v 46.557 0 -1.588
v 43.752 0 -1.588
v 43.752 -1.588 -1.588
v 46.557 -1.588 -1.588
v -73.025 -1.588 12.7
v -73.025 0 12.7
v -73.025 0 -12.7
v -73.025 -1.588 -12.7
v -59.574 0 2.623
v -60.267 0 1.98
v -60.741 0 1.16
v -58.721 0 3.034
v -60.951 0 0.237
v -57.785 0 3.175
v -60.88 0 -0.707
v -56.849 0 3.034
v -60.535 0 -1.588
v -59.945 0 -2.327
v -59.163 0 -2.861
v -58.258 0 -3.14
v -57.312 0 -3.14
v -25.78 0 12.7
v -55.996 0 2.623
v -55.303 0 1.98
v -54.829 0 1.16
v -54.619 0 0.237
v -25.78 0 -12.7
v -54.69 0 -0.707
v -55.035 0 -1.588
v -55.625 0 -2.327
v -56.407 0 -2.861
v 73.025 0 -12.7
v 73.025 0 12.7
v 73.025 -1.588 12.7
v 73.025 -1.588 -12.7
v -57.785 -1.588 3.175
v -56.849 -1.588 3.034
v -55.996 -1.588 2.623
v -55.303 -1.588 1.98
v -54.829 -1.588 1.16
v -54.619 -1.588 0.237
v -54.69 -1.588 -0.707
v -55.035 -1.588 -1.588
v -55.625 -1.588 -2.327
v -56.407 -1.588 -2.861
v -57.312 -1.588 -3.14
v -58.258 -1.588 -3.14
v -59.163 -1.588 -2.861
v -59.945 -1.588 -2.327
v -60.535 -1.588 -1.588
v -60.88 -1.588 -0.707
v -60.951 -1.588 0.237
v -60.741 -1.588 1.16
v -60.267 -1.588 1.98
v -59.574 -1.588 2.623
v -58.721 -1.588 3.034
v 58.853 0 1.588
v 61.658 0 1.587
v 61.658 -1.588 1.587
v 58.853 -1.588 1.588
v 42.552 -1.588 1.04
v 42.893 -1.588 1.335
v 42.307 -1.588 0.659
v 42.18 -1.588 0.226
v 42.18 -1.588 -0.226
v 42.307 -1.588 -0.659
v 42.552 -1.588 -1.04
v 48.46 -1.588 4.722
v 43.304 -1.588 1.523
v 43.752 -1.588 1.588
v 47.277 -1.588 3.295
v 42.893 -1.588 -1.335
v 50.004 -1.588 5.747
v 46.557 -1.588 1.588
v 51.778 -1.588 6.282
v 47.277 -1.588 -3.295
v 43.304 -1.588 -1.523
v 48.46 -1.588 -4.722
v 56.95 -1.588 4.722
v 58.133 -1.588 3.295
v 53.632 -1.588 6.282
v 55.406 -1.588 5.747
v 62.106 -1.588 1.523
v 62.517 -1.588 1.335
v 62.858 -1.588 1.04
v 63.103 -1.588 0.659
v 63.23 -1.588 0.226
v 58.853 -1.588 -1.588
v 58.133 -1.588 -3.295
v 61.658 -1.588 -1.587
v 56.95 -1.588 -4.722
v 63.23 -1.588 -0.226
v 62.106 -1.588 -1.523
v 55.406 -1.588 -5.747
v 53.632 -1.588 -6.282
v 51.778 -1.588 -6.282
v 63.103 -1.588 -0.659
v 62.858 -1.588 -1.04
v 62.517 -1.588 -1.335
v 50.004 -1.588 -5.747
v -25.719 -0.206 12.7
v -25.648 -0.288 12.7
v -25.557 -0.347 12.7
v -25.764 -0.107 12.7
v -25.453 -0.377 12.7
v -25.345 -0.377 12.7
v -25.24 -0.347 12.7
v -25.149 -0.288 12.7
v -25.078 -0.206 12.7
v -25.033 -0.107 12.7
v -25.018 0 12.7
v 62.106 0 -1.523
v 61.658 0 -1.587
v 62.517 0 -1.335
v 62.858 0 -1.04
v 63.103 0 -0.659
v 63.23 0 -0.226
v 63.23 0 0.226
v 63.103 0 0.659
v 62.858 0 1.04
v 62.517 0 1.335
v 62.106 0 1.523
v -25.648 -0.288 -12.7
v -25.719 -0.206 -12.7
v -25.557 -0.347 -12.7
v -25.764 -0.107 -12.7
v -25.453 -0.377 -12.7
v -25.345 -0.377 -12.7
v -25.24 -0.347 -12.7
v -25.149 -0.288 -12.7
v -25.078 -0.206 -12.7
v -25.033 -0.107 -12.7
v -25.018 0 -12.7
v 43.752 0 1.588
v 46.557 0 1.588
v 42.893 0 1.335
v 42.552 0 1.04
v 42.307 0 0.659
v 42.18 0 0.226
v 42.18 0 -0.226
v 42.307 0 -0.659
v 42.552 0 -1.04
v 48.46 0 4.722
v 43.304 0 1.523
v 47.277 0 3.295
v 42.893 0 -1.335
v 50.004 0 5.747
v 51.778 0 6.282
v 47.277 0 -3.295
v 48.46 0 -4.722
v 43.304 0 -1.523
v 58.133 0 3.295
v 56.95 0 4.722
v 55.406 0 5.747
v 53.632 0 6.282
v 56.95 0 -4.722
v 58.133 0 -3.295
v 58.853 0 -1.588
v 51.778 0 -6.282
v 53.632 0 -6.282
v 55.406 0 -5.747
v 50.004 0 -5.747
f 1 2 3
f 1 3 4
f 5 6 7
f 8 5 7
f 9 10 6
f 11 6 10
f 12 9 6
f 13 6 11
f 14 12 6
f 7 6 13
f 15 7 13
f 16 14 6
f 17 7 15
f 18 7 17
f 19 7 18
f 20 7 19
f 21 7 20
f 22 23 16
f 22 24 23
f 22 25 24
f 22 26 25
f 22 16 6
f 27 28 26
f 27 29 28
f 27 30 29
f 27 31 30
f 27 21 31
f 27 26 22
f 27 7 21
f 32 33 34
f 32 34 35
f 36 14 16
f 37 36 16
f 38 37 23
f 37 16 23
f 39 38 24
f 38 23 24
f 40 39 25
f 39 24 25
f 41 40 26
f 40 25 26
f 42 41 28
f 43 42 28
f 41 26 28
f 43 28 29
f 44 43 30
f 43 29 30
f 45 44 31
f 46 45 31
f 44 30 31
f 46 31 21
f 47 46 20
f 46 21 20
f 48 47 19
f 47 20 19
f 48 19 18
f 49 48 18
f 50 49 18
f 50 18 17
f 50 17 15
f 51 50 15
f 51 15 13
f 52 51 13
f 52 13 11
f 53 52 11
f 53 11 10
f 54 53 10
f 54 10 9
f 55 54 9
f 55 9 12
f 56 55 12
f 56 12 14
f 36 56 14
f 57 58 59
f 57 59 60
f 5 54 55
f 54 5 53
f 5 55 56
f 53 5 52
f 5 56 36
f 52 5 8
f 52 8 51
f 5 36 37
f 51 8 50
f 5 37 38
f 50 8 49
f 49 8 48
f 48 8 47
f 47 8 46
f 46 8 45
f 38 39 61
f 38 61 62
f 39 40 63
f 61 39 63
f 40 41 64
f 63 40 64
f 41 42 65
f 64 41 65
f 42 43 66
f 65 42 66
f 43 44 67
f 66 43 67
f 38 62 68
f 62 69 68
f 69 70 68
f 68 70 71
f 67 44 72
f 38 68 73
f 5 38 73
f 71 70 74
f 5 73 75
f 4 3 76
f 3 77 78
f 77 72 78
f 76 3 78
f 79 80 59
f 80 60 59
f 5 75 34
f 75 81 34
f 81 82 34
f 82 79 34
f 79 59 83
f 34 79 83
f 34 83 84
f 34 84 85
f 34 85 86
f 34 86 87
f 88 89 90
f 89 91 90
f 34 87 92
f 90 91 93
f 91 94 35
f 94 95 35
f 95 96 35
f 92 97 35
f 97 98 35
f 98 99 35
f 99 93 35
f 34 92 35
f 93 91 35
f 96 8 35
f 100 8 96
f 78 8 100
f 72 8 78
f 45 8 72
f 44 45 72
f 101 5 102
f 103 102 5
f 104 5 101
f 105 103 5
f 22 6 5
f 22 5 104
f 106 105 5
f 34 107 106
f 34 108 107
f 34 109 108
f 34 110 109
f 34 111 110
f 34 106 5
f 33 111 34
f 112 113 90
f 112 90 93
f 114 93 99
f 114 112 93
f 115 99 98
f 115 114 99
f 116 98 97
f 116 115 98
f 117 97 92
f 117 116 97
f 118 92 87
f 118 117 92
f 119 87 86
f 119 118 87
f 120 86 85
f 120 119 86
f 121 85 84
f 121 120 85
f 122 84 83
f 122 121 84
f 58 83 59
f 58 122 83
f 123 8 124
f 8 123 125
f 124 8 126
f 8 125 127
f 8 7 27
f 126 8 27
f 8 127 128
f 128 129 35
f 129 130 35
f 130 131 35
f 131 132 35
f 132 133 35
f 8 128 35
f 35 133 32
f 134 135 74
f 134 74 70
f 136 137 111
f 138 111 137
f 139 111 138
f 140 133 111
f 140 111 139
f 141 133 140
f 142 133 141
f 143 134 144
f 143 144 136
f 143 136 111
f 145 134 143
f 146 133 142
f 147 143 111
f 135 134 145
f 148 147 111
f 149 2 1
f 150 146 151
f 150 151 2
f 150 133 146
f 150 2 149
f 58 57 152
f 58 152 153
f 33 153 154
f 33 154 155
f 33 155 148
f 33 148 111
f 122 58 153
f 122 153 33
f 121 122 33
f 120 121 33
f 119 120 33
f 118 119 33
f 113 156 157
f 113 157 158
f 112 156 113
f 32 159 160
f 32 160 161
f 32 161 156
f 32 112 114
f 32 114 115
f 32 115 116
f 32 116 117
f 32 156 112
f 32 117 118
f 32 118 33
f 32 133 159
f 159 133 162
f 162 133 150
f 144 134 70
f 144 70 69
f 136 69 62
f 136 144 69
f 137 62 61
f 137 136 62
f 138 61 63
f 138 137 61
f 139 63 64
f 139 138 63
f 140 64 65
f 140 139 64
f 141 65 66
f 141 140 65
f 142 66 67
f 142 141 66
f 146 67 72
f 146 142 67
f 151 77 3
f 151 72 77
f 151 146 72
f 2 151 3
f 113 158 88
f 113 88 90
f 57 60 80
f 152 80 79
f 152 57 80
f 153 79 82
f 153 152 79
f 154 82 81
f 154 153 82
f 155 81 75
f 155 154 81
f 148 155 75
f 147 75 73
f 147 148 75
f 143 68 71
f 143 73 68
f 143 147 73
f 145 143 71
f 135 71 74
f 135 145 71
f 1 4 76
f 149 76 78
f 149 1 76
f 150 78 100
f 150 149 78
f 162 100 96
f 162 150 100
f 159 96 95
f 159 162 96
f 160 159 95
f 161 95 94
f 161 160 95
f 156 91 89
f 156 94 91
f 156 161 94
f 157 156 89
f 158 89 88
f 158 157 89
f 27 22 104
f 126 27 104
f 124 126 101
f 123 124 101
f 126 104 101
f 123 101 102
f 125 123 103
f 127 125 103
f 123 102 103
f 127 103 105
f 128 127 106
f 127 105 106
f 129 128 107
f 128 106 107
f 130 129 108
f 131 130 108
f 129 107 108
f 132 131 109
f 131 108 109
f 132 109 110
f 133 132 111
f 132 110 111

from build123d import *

# Parameters (mm, degrees)
SKETCH1_W          = 146.05
SKETCH1_H          = 25.4
BASE_FLANGE1_DEPTH = 1.5875
SKETCH6_R          = 3.175
CUT_EXTRUDE1_DEPTH = 2.54
CUT_EXTRUDE3_DEPTH = 2.54
SKETCH10_R         = 0.381
CUT_EXTRUDE4_DEPTH = 25.654


# Sheet-metal steps are written as plain solids
with BuildPart() as part:
    # Sketch1 → Base-Flange1 (new body)
    with BuildSketch(Plane(origin=(0, 0, 0), x_dir=(1, 0, 0), z_dir=(0, 1, 0))):
        Rectangle(SKETCH1_W, SKETCH1_H)
    extrude(amount=-BASE_FLANGE1_DEPTH)

    # Sketch6 → Cut-Extrude1 (cut)
    with BuildSketch(Plane(origin=(0, 0, 0), x_dir=(1, 0, 0), z_dir=(0, 1, 0))):
        with Locations(Location((-57.785, 0, 0), (0, 0, 270))):
            Circle(SKETCH6_R)
    extrude(amount=-CUT_EXTRUDE1_DEPTH, mode=Mode.SUBTRACT)

    # Sketch8 → Cut-Extrude3 (cut)
    with BuildSketch(Plane(origin=(0, 0, 0), x_dir=(1, 0, 0), z_dir=(0, 1, 0))):
        with BuildLine():
            Line((43.7515, 1.5875), (46.556638938, 1.5875))
            ThreePointArc((46.556638938, 1.5875), (52.705, 6.35), (58.853361062, 1.5875))
            Line((58.853361062, 1.5875), (61.6585, 1.5875))
            ThreePointArc((61.6585, 1.5875), (63.246, 0), (61.6585, -1.5875))
            Line((61.6585, -1.5875), (58.853361062, -1.5875))
            ThreePointArc((58.853361062, -1.5875), (52.705, -6.35), (46.556638938, -1.5875))
            Line((46.556638938, -1.5875), (43.7515, -1.5875))
            ThreePointArc((43.7515, -1.5875), (42.164, 0), (43.7515, 1.5875))
        make_face()
    extrude(amount=-CUT_EXTRUDE3_DEPTH, mode=Mode.SUBTRACT)

    # Sketch10 → Cut-Extrude4 (cut)
    with BuildSketch(Plane.XY.offset(12.7)):
        with Locations((-25.398772406, 0)):
            Circle(SKETCH10_R)
    extrude(amount=-CUT_EXTRUDE4_DEPTH, mode=Mode.SUBTRACT)


solid = part.part
